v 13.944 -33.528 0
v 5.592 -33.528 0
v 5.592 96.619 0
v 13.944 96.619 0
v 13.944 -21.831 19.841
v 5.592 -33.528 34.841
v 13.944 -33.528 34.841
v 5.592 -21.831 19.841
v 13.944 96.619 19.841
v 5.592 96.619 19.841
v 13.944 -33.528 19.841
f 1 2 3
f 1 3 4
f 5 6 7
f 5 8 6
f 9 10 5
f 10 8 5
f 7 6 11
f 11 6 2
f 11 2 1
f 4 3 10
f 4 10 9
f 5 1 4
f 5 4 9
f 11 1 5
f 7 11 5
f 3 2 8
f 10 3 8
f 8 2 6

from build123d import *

# Parameters (mm, degrees)
F0_W      = 8.3522722125
F0_H      = 65.1477314532
F1_DEPTH  = 19.841
F2_W      = 8.3522722125
F2_H      = 11.6972830147
F3_DEPTH  = 15
F3_FACE_W = 8.3522722125
F3_FACE_H = 11.6972830147
F1_FACE_W = 8.3522722125
F1_FACE_H = 53.4504484385
F5_DEPTH  = 65


with BuildPart() as f1:
    # F0 (on Top) → F1 (new body)
    with BuildSketch(Plane.XY):
        with Locations((9.7681805491, -0.9545441717)):
            Rectangle(F0_W, F0_H)
    extrude(amount=F1_DEPTH)

    # F2 (on face) → F3 (join)
    with BuildSketch(Plane.XY.offset(19.841)):
        with Locations((9.7681805491, -27.679768391)):
            Rectangle(F2_W, F2_H)
    extrude(amount=F3_DEPTH)

    # F3_face (on face) → F4 section 0
    with BuildSketch(Plane(origin=(9.7681805491, -27.679768391, 34.841), x_dir=(1, 0, 0), z_dir=(0, 0, 1))):
        Rectangle(F3_FACE_W, F3_FACE_H)
    # F1_face (on face) → F4 section 1
    with BuildSketch(Plane(origin=(9.7681805491, -0.9545441717, 19.841), x_dir=(1, 0, 0), z_dir=(0, 0, 1))):
        with Locations((0, 5.8486415073)):
            Rectangle(F1_FACE_W, F1_FACE_H)
    loft(mode=Mode.SUBTRACT)

    # F5 (add): a face of the model
    f5_faces = [f1.faces().sort_by_distance(p)[0] for p in [
        (9.7681805491, 31.6193215549, 9.9205),
    ]]
    extrude(f5_faces, amount=F5_DEPTH)


solid = f1.part
